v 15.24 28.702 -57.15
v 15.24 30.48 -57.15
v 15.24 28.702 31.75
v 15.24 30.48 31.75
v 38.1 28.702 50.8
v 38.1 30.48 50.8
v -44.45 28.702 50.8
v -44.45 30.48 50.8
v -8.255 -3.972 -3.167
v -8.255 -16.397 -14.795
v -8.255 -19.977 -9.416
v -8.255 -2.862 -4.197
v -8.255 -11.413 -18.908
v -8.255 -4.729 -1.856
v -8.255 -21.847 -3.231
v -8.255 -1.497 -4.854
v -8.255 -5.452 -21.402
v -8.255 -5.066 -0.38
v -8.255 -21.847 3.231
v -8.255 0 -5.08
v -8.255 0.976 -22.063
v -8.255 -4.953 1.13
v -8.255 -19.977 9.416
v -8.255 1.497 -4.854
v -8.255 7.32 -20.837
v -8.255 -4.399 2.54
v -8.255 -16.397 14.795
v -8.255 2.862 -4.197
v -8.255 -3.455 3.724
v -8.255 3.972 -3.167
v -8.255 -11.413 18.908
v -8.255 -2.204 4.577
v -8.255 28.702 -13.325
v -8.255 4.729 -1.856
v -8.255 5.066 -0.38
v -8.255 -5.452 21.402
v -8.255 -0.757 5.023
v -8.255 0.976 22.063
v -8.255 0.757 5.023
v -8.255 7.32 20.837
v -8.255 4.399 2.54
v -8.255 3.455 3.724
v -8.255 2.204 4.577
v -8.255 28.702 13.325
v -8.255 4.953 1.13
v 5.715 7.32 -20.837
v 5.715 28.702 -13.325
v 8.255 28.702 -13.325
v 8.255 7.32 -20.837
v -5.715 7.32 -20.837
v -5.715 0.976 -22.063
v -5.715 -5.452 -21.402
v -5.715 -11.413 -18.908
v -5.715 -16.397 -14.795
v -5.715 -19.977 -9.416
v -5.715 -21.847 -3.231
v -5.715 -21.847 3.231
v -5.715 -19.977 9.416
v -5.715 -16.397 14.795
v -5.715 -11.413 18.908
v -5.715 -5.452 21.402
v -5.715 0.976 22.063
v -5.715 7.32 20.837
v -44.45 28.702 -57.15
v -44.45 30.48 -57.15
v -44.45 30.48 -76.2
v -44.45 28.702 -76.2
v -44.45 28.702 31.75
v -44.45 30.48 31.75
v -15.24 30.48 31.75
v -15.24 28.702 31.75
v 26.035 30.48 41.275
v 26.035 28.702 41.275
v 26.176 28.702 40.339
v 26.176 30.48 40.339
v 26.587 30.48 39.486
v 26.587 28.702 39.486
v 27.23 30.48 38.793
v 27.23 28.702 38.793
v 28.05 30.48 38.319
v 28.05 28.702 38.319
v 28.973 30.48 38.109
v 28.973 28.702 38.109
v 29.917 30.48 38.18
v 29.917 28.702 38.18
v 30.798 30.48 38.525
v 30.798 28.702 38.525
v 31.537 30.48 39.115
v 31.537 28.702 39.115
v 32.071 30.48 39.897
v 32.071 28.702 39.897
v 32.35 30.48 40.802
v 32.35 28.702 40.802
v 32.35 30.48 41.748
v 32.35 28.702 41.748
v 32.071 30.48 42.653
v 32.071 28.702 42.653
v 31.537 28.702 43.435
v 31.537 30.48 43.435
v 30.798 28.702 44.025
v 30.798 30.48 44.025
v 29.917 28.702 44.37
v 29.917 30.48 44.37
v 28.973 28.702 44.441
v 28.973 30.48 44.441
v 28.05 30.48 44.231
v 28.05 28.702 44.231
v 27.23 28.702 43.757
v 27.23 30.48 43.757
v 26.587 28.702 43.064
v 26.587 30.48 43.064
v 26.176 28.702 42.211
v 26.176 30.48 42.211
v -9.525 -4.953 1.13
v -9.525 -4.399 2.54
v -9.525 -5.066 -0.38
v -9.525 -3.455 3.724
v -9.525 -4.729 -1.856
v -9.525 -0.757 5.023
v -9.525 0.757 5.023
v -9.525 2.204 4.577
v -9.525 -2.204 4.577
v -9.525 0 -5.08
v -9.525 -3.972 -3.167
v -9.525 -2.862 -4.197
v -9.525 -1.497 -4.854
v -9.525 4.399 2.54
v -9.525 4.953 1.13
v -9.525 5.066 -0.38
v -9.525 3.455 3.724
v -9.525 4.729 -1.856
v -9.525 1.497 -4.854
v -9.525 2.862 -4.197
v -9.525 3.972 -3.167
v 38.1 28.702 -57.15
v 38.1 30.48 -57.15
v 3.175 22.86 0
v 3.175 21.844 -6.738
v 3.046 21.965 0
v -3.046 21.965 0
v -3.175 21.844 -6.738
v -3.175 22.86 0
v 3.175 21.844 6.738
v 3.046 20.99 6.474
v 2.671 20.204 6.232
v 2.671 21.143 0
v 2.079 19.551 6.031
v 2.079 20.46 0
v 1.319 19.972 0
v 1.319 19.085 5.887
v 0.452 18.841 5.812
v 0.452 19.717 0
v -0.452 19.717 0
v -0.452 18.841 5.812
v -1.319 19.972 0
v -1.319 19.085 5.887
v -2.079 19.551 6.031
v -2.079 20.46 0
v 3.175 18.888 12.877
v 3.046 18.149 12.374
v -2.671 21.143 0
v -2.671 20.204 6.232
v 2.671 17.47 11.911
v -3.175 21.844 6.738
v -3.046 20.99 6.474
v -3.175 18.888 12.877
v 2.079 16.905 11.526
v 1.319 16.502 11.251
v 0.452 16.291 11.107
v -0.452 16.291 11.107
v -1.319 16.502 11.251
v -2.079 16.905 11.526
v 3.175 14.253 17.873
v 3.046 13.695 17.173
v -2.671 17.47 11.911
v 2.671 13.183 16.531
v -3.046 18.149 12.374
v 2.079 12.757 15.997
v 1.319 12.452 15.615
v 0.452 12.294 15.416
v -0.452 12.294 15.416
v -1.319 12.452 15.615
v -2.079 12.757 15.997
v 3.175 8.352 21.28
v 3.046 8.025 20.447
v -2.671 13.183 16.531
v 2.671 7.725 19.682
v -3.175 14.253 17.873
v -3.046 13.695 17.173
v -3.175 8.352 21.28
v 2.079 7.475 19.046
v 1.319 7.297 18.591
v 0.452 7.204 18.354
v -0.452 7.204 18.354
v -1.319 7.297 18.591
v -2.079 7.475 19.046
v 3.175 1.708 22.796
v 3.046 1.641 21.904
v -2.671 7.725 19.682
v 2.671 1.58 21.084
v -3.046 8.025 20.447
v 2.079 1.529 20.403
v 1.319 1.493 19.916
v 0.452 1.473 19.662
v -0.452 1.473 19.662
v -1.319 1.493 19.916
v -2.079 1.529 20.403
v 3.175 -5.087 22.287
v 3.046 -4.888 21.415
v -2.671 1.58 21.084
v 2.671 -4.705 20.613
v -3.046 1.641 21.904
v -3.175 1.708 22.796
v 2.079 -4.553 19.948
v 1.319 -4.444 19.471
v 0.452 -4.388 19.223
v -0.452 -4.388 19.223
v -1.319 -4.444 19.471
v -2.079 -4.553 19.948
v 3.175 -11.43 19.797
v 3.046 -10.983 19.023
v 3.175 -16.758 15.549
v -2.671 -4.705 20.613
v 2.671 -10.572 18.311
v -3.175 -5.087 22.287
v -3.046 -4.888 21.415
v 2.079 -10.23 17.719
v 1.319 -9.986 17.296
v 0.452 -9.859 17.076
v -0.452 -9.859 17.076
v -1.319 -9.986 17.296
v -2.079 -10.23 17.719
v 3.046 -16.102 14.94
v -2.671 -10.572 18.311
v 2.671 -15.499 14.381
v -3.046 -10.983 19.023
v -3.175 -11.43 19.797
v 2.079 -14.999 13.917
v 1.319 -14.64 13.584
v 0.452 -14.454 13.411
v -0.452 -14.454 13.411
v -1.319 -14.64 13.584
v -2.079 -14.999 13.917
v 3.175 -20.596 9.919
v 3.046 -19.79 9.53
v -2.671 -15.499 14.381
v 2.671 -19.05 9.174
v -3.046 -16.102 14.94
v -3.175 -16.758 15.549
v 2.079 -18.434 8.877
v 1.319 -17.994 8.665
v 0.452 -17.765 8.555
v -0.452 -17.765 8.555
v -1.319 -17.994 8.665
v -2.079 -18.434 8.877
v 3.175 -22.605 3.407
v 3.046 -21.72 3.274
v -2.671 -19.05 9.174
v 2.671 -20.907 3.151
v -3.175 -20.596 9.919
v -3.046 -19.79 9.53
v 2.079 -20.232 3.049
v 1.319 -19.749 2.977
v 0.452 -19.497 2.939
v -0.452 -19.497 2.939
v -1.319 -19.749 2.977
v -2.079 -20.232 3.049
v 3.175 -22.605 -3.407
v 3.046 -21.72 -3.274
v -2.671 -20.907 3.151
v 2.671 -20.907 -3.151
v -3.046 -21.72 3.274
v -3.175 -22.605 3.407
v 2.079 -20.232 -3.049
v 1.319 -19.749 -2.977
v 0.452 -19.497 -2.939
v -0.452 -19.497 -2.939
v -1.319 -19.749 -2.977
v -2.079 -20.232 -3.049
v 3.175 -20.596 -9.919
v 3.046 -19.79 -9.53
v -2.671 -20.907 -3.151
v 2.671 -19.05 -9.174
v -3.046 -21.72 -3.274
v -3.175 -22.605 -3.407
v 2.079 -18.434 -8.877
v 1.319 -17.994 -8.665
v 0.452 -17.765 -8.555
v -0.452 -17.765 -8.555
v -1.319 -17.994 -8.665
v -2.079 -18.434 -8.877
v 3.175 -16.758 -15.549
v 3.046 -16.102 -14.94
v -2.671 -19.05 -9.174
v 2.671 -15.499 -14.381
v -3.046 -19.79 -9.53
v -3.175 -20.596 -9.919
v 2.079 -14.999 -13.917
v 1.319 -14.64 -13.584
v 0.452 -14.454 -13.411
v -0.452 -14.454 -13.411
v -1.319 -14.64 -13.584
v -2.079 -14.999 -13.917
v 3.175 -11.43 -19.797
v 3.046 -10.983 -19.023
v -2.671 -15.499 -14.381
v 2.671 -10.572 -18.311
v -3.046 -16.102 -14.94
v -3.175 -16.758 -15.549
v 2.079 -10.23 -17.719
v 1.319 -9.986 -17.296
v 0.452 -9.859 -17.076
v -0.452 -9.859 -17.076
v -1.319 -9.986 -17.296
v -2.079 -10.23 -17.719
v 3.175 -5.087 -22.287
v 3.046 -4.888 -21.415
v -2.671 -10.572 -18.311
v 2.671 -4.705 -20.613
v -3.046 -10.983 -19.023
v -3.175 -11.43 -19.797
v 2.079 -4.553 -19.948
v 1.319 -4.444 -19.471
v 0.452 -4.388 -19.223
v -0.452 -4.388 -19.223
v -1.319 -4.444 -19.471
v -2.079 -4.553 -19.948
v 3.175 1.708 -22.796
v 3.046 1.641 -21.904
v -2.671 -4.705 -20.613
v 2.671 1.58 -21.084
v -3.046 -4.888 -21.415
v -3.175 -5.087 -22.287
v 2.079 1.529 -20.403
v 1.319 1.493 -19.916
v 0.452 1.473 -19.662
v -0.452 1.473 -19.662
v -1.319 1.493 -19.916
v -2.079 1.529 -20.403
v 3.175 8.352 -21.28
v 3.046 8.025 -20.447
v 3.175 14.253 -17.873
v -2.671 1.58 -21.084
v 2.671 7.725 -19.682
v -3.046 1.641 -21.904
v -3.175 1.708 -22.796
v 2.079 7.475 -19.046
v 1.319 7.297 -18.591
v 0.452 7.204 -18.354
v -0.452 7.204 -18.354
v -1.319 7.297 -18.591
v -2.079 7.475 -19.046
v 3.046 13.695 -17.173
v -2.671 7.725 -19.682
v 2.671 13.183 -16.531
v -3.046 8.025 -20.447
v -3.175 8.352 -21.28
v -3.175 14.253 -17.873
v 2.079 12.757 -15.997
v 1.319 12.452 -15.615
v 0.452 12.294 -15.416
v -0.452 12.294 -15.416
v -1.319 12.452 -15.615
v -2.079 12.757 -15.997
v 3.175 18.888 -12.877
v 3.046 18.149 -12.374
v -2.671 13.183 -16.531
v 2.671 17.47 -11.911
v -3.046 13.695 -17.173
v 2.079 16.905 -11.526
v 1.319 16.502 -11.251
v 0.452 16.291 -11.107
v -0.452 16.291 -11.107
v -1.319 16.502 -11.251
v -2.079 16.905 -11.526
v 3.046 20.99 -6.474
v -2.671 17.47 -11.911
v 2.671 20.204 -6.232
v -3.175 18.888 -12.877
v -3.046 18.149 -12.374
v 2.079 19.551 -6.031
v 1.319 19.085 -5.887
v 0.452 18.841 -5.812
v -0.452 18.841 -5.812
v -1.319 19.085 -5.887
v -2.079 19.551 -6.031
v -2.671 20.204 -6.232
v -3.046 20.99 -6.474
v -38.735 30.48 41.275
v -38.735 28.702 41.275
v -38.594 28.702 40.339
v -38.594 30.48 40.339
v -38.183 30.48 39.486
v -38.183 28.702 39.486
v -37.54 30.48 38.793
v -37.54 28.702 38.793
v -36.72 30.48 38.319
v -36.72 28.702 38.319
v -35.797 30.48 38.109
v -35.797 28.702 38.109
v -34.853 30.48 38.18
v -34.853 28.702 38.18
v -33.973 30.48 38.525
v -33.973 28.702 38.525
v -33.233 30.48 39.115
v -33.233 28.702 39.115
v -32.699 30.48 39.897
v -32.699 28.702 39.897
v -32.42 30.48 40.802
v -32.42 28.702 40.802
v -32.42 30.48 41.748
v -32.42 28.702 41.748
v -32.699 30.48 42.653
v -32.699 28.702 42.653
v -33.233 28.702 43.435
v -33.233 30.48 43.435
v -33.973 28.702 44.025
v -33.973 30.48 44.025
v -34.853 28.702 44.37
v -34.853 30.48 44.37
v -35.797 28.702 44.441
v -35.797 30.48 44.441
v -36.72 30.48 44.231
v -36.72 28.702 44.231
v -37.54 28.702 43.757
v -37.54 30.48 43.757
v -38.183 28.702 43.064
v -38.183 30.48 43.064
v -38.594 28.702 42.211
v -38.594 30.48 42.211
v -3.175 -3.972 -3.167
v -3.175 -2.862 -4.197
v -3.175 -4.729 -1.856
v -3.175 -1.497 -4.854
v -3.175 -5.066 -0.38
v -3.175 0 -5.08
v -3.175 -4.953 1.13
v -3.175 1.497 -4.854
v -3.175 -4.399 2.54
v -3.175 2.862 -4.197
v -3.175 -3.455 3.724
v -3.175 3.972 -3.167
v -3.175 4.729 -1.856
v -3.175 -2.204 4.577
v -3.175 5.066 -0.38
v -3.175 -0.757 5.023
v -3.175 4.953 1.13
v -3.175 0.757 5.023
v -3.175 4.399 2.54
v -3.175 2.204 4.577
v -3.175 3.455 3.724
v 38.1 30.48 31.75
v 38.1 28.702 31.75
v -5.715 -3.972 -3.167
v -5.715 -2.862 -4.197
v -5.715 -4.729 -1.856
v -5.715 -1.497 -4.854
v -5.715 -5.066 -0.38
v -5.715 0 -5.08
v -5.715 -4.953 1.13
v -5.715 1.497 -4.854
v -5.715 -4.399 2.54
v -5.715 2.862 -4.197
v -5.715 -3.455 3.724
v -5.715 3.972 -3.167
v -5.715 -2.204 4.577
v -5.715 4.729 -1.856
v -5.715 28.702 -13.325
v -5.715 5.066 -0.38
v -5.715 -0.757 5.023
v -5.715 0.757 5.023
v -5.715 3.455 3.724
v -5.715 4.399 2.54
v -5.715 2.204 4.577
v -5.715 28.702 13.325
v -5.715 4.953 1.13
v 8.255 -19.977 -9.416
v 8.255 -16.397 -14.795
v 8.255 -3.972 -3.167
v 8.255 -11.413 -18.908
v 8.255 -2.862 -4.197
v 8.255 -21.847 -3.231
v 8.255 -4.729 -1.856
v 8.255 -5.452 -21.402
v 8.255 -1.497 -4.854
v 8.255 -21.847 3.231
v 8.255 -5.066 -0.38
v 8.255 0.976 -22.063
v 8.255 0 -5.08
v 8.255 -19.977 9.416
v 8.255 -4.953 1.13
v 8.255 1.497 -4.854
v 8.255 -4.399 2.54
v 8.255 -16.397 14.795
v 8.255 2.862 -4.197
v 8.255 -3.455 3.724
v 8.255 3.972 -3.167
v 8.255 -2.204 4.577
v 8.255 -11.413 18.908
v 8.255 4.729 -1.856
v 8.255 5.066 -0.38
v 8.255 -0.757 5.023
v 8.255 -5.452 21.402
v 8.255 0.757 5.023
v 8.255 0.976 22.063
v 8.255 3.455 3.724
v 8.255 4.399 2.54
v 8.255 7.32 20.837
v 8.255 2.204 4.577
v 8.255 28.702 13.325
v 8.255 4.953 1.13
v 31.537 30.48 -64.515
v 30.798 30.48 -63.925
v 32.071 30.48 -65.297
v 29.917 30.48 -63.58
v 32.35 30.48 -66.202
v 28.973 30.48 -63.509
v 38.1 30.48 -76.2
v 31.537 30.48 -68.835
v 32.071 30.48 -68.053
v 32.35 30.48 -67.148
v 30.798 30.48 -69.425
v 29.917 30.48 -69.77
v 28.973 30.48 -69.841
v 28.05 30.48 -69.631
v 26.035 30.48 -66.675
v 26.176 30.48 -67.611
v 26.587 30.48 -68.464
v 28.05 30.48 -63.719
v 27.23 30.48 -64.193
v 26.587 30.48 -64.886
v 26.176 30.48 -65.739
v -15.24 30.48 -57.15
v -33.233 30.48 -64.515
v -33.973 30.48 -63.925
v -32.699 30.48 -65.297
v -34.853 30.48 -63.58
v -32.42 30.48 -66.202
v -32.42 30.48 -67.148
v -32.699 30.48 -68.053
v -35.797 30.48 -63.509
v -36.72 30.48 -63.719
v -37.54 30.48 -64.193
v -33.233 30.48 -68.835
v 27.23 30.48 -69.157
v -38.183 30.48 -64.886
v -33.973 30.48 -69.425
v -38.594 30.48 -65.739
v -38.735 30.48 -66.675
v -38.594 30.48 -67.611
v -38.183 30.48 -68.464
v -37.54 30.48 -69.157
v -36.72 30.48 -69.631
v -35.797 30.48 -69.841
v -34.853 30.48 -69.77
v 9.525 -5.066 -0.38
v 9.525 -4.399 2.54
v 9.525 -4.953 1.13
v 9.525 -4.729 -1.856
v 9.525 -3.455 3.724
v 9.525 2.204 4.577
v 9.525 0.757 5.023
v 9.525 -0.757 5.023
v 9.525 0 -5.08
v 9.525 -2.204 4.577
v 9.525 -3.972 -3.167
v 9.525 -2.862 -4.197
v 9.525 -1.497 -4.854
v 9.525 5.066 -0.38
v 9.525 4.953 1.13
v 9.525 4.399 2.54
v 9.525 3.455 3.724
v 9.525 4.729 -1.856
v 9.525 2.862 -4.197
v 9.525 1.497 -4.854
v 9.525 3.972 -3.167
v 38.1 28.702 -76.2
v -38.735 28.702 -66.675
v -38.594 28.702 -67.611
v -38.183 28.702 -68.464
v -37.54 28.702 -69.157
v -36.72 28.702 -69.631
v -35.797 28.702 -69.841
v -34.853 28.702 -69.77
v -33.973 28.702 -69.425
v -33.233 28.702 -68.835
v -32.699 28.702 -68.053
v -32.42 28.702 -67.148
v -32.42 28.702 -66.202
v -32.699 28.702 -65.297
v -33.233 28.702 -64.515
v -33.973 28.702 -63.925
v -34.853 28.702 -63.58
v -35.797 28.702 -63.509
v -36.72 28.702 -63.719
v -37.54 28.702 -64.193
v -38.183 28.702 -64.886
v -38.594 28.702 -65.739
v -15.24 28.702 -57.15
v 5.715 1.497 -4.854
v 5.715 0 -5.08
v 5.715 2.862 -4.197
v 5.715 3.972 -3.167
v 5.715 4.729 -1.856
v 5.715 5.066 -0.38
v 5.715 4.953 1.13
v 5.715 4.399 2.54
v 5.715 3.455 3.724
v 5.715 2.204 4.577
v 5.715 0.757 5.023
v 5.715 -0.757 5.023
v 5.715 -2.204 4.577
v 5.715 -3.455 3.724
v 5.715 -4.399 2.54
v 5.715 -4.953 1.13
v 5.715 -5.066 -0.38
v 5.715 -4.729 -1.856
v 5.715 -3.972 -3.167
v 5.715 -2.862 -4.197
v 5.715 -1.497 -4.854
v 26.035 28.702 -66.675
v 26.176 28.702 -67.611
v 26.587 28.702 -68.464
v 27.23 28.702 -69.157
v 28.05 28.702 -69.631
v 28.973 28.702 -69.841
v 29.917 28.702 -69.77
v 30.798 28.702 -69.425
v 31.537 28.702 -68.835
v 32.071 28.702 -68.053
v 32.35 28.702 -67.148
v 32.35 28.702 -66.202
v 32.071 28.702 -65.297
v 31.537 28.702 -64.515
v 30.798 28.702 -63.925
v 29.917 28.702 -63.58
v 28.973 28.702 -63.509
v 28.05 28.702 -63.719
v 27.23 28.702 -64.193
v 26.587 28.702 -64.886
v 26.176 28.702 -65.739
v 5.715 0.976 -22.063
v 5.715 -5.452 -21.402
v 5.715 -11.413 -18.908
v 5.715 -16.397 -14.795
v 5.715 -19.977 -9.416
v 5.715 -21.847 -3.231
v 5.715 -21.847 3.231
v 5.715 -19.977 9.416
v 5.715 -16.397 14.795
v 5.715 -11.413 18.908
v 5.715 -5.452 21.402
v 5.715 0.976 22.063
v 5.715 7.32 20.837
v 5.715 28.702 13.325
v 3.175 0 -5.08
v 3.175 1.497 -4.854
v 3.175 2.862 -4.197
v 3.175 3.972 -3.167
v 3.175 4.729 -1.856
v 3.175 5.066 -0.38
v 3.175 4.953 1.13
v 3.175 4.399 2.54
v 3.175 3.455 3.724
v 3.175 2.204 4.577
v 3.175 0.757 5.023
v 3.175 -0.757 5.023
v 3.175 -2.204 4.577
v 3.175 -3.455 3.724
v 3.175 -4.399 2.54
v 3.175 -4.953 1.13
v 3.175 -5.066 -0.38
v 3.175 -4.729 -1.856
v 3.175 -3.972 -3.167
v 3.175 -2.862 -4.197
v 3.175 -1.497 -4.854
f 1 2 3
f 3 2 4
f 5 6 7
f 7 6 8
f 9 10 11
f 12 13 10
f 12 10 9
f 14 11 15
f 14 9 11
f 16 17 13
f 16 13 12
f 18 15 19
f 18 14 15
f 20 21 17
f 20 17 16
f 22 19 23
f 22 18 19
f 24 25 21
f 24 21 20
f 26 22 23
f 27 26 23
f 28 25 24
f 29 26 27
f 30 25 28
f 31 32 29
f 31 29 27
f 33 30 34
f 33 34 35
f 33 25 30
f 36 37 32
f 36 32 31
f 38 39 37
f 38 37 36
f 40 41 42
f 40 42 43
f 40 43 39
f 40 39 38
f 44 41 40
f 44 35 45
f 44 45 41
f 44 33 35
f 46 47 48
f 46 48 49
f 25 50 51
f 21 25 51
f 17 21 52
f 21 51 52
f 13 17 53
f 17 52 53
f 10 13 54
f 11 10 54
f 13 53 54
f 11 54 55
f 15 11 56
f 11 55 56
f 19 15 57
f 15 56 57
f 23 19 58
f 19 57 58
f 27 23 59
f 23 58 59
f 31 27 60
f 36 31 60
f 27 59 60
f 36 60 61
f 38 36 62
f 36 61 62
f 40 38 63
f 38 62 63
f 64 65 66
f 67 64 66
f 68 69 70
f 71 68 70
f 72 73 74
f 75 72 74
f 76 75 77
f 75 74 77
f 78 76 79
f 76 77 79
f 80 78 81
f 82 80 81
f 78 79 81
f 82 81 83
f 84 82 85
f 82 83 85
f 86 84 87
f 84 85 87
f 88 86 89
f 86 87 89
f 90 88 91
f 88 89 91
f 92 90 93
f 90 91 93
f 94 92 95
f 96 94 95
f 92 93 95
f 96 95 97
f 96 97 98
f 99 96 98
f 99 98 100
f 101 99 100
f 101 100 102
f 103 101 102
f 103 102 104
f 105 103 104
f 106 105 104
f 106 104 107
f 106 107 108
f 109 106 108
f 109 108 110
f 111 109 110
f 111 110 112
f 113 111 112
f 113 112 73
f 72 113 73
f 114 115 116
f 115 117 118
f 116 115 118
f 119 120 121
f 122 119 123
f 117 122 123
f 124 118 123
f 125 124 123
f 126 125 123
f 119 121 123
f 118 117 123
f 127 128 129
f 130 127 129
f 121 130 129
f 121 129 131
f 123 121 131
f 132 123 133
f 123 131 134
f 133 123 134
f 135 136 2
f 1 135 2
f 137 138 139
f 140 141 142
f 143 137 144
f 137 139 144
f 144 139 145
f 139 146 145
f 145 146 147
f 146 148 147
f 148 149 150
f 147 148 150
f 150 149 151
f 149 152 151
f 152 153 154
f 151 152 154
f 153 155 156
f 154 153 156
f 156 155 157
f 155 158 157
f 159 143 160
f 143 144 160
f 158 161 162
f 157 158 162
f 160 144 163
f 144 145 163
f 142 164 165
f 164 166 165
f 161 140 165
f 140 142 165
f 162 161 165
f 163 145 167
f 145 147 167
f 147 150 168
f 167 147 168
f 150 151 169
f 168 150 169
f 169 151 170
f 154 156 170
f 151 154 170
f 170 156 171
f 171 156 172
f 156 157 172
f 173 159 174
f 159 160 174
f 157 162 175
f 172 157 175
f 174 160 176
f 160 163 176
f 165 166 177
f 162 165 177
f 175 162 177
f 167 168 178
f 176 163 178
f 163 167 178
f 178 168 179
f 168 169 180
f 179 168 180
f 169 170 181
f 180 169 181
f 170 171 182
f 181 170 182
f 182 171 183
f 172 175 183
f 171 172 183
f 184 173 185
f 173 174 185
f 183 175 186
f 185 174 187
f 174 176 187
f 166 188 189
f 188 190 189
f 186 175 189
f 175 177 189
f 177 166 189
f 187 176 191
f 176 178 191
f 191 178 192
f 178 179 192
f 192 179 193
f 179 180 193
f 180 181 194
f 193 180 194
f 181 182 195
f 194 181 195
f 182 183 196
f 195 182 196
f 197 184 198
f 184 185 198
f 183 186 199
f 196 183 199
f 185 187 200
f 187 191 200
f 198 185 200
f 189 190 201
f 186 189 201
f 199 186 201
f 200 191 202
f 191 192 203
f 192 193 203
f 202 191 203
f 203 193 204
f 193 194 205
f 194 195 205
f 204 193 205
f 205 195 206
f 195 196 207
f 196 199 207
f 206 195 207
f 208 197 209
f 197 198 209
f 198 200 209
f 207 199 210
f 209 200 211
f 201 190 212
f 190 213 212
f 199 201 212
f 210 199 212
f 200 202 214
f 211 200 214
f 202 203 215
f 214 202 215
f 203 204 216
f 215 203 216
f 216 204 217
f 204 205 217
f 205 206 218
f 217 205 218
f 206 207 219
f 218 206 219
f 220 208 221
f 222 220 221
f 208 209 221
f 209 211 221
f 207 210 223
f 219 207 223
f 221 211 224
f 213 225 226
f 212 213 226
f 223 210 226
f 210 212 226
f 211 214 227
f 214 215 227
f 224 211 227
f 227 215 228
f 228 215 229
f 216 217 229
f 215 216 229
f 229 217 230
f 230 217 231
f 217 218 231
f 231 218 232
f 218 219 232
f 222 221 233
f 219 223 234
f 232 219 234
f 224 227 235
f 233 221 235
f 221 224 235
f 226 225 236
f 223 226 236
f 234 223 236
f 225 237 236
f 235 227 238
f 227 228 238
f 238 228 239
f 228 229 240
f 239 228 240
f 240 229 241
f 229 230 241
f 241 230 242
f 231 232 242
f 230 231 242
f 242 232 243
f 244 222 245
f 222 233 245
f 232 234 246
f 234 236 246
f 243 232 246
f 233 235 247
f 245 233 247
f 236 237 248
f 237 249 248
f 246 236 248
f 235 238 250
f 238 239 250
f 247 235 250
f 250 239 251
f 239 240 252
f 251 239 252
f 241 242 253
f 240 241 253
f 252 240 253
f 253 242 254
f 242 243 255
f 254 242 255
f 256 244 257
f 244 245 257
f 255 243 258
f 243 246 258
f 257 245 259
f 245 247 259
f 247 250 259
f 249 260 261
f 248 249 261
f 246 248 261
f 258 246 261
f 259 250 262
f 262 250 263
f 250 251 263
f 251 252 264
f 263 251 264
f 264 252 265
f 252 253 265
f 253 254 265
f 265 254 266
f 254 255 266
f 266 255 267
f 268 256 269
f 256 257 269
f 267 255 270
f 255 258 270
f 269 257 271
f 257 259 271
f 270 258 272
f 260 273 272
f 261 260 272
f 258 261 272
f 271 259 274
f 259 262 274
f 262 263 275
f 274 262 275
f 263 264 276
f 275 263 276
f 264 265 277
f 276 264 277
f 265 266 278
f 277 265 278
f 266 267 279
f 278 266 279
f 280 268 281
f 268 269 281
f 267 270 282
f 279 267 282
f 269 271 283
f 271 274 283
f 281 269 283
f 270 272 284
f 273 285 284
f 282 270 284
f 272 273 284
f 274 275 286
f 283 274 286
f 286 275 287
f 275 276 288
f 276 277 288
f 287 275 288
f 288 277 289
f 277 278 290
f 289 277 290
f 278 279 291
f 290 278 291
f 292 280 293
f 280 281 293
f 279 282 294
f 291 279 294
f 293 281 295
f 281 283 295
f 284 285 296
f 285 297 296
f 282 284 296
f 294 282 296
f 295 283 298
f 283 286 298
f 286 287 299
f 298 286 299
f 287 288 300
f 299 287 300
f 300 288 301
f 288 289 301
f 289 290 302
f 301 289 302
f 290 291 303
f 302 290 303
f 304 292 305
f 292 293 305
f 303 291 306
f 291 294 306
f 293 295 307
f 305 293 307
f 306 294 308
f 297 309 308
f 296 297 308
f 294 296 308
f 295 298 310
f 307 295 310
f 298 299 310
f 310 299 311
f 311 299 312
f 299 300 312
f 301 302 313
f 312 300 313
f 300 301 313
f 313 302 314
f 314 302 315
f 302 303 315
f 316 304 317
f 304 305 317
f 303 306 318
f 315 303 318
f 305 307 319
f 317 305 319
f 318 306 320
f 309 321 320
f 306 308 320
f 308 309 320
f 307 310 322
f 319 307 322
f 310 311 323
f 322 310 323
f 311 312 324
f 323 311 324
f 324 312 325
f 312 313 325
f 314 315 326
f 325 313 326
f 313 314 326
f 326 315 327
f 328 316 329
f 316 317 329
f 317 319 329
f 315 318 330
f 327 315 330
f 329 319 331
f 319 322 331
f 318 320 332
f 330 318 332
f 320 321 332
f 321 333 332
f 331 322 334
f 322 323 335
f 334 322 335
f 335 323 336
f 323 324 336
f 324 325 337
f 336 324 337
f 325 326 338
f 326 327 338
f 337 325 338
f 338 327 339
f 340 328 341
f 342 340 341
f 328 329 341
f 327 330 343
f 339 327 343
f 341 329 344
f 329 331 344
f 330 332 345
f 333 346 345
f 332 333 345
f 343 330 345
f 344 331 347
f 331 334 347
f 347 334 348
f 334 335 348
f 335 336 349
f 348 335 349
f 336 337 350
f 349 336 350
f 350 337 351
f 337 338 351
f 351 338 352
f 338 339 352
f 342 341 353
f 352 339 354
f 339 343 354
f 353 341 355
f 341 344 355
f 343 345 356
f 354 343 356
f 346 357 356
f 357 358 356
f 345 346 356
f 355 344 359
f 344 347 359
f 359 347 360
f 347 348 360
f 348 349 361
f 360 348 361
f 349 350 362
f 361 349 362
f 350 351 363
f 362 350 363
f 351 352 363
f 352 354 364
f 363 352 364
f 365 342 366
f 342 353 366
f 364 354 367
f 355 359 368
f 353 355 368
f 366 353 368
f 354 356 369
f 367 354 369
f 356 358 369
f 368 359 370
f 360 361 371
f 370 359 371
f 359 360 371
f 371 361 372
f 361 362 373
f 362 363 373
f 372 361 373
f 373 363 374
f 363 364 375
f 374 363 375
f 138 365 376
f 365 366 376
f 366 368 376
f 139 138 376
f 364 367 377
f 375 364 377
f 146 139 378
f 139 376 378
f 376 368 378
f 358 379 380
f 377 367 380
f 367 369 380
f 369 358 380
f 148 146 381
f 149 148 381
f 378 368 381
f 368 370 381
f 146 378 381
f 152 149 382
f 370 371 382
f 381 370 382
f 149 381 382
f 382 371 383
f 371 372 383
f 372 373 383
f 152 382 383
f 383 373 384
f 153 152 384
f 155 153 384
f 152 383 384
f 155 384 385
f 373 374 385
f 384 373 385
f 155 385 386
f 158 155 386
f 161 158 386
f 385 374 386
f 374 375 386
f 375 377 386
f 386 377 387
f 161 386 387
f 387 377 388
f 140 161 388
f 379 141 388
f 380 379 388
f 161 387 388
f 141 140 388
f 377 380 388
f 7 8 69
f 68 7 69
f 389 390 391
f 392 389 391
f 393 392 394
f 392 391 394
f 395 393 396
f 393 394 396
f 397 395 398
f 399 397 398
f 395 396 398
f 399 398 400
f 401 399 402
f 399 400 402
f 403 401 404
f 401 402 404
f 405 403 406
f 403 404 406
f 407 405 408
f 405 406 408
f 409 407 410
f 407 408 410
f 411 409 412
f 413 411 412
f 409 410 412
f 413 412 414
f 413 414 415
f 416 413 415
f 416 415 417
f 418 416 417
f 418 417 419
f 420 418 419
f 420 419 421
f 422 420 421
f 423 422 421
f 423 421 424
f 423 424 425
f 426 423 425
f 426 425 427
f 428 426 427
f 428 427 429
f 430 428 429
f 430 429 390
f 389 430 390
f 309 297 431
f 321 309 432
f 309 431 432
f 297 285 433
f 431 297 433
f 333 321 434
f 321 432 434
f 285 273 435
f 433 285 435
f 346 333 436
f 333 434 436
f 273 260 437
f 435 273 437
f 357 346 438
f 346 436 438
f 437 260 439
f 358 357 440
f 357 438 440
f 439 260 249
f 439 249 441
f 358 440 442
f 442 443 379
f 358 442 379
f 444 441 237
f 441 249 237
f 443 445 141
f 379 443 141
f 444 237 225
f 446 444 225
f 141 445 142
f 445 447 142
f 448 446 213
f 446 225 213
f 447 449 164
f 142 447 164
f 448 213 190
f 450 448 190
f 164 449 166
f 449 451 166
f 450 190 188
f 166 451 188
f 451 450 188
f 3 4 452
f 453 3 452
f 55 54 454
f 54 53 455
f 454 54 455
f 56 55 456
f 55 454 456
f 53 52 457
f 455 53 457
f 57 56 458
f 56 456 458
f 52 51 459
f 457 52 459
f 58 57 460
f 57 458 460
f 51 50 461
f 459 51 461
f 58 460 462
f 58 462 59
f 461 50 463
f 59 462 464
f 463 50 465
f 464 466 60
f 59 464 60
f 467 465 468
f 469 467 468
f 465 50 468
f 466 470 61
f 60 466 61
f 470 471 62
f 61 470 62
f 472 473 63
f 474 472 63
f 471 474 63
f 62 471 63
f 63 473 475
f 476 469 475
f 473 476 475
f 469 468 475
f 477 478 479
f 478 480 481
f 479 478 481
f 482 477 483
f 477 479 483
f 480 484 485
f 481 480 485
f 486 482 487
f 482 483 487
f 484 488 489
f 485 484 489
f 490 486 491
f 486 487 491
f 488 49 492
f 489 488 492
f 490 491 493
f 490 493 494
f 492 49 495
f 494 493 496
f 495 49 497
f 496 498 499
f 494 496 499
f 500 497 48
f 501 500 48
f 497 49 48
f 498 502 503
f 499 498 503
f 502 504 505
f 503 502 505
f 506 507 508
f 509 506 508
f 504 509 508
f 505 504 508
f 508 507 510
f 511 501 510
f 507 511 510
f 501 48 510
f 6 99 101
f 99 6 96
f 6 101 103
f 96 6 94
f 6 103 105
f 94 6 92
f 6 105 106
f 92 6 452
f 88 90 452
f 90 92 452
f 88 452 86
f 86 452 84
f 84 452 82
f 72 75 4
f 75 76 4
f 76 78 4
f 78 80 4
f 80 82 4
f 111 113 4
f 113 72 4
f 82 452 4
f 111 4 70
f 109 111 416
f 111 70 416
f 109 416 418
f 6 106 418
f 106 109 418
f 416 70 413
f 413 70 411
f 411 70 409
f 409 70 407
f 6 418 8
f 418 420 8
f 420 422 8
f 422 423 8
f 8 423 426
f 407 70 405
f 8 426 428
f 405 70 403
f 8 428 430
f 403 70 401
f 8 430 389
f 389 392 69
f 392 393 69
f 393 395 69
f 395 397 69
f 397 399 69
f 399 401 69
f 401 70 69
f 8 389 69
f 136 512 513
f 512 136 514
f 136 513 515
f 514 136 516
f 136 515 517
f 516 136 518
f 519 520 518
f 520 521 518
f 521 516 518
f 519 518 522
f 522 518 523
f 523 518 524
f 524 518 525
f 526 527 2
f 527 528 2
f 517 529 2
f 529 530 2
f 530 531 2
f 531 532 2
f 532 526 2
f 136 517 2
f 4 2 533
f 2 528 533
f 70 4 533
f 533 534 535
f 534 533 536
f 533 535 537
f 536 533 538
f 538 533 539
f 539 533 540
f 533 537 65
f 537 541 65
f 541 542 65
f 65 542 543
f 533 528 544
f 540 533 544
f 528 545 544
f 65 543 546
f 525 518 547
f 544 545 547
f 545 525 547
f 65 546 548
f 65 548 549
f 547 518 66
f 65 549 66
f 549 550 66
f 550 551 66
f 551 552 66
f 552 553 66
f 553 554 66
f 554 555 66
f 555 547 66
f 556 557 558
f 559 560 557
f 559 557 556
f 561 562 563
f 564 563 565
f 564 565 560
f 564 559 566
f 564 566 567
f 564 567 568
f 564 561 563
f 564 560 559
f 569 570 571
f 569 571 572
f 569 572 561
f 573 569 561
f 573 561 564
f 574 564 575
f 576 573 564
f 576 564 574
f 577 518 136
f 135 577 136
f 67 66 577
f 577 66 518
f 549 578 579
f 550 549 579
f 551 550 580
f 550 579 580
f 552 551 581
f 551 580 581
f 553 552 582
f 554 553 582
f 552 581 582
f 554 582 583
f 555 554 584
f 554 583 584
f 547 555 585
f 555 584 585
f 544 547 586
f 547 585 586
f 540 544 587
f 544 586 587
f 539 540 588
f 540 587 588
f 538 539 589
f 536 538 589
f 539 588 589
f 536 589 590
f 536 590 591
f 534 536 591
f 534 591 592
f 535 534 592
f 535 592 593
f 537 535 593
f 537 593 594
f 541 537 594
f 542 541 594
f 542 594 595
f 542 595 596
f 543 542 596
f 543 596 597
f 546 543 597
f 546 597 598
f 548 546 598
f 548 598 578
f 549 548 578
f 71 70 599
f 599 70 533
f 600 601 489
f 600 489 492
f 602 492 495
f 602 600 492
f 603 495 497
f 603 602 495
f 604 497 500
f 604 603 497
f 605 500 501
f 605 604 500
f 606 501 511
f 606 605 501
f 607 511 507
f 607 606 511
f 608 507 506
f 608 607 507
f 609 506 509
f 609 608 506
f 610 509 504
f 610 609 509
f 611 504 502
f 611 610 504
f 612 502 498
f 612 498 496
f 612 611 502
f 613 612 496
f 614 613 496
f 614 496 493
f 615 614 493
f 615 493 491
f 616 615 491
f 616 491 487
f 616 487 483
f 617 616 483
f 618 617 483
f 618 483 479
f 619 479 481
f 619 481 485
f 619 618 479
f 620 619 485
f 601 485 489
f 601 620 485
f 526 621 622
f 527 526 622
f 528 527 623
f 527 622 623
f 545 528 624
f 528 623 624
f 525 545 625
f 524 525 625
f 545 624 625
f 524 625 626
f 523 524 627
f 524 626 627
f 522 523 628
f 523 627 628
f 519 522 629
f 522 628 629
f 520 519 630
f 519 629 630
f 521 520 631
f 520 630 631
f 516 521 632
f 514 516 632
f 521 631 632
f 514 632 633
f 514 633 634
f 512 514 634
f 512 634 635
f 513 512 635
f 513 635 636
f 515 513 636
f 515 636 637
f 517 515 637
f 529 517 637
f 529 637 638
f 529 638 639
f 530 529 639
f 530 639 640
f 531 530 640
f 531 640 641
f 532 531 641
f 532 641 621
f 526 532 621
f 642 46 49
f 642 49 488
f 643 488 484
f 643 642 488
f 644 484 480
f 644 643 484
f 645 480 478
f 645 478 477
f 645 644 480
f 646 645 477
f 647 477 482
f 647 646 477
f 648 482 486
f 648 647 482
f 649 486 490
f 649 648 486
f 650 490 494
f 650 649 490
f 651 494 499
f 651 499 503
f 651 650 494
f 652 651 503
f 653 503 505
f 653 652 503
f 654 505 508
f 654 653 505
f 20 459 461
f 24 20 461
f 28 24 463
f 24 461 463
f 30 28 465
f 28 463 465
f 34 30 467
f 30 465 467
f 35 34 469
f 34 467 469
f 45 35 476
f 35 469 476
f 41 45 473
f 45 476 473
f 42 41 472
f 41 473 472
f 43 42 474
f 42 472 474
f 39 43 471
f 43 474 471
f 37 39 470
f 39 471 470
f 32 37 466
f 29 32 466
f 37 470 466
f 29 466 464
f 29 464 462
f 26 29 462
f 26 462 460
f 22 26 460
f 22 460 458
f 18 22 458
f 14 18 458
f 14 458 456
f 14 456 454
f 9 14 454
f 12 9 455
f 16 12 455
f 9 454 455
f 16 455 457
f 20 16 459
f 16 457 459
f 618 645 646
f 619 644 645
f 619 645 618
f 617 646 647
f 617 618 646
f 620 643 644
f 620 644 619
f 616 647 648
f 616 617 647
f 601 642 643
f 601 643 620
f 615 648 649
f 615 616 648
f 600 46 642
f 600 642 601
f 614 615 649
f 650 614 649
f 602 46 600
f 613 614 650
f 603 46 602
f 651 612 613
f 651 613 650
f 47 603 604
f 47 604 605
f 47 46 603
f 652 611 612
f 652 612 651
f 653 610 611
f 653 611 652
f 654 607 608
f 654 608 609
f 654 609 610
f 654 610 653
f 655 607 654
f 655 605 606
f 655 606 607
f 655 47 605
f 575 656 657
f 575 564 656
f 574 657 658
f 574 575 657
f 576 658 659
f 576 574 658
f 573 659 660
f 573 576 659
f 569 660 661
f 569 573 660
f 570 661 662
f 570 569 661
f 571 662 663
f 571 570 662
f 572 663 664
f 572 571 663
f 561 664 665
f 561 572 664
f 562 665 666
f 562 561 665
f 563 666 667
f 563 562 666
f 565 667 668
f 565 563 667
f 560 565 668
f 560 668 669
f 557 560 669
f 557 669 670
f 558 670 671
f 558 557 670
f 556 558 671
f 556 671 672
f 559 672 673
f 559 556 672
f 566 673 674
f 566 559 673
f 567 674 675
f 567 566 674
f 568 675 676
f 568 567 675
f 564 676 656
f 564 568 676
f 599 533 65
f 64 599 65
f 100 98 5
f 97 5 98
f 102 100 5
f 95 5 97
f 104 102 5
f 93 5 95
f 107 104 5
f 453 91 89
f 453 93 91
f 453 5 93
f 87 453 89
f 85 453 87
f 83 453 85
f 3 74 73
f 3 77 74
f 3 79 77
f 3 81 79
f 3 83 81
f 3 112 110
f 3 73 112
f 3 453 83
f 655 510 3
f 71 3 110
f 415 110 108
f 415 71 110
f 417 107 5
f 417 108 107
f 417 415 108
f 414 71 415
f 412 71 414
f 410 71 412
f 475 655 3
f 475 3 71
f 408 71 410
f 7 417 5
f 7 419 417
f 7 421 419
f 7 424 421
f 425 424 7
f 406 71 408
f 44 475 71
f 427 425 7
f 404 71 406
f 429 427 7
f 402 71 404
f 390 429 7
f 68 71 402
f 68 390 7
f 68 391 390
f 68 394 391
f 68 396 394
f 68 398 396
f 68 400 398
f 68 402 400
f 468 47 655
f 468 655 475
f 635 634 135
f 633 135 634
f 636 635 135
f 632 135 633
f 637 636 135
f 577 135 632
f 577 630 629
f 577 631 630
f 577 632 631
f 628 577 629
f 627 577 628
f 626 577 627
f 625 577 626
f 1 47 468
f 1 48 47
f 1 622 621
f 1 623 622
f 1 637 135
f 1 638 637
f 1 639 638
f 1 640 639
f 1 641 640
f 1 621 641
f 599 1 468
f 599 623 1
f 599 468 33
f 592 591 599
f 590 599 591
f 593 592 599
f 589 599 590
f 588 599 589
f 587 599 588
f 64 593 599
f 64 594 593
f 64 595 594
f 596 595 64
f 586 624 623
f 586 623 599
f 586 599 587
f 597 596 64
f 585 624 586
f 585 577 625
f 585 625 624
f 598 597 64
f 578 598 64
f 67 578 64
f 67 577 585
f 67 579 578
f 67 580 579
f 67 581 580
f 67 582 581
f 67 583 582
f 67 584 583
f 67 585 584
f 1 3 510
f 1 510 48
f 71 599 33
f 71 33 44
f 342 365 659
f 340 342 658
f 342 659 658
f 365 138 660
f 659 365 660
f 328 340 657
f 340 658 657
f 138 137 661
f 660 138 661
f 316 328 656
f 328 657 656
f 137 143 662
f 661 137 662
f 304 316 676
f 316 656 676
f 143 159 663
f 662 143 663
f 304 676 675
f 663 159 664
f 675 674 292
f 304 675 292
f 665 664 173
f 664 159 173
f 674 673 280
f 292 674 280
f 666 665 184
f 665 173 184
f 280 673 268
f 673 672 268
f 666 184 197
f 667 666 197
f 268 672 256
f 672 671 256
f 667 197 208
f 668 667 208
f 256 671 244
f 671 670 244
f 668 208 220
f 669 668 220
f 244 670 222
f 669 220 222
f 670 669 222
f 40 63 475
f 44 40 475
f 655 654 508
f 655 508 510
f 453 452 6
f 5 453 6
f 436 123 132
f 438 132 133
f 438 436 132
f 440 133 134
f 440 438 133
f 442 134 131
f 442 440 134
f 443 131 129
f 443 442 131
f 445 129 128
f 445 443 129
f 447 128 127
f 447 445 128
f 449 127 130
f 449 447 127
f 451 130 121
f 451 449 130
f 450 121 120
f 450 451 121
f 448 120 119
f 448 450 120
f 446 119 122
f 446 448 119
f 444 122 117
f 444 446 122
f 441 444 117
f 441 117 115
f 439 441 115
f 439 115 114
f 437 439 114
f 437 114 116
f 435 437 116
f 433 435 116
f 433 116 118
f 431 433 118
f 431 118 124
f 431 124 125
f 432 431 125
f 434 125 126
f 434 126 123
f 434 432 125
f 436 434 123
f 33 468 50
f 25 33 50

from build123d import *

# Parameters (mm, degrees)
SKETCH2_R           = 5.08
BOSS_EXTRUDE1_DEPTH = 2.54
BOSS_EXTRUDE2_DEPTH = 1.778
SKETCH4_R           = 3.175
CUT_EXTRUDE2_DEPTH  = 2.778
SKETCH6_R           = 5.08
BOSS_EXTRUDE4_DEPTH = 9.525


with BuildPart() as part:
    # Sketch1 → Revolve1 (revolve)
    with BuildSketch(Plane.XY):
        with BuildLine():
            Line((-3.175, 5.08), (3.175, 5.08))
            Line((3.175, 5.08), (3.175, 22.86))
            ThreePointArc((3.175, 22.86), (0, 19.685), (-3.175, 22.86))
            Line((-3.175, 22.86), (-3.175, 5.08))
        make_face()
    revolve(axis=Axis((0, 0, 0), (1, 0, 0)))

    # Sketch6 → Boss-Extrude4 (add, symmetric)
    with BuildSketch(Plane(origin=(0, 0, 0), x_dir=(0, 0, -1), z_dir=(1, 0, 0))):
        Circle(SKETCH6_R)
    extrude(amount=BOSS_EXTRUDE4_DEPTH, both=True)


with BuildPart() as body_2:
    # Sketch2 → Boss-Extrude1 (new body)
    with BuildSketch(Plane(origin=(5.715, 0, 0), x_dir=(0, 0, -1), z_dir=(1, 0, 0))):
        with BuildLine():
            Line((-20.836536434, 7.320381186), (-12.7, 30.48))
            Line((-12.7, 30.48), (12.7, 30.48))
            Line((12.7, 30.48), (20.836536434, 7.320381186))
            ThreePointArc((20.836536434, 7.320381186), (0, -22.085045421), (-20.836536434, 7.320381186))
        make_face()
        Circle(SKETCH2_R, mode=Mode.SUBTRACT)
    extrude(amount=BOSS_EXTRUDE1_DEPTH)


with BuildPart() as body_3:
    # Mirror2: mirrored copy
    add(body_2.part.mirror(Plane(origin=(0, 0, 0), x_dir=(0, 0, 1), z_dir=(1, 0, 0))))


with BuildPart() as body_2_1:
    add(body_2.part)

    add(body_3.part)  # Boss-Extrude2 merges body 3
    # Sketch3 → Boss-Extrude2 (add)
    with BuildSketch(Plane(origin=(0, 30.48, 0), x_dir=(1, 0, 0), z_dir=(0, 1, 0))):
        Polygon((15.24, 57.15), (15.24, -31.75), (38.1, -31.75), (38.1, -50.8), (-44.45, -50.8), (-44.45, -31.75), (-15.24, -31.75), (-15.24, 57.15), (-44.45, 57.15), (-44.45, 76.2), (38.1, 76.2), (38.1, 57.15), align=None)
    extrude(amount=-BOSS_EXTRUDE2_DEPTH)

    # Sketch4 → Cut-Extrude2 (cut, through all)
    with BuildSketch(Plane(origin=(0, 28.702, 0), x_dir=(-1, 0, 0), z_dir=(0, -1, 0))):
        with Locations((-29.21, -41.275)):
            Circle(SKETCH4_R)
        with Locations((35.56, -41.275)):
            Circle(SKETCH4_R)
        with Locations((-29.21, 66.675)):
            Circle(SKETCH4_R)
        with Locations((35.56, 66.675)):
            Circle(SKETCH4_R)
    extrude(amount=-CUT_EXTRUDE2_DEPTH, mode=Mode.SUBTRACT)


solid = Compound([part.part, body_2_1.part])
